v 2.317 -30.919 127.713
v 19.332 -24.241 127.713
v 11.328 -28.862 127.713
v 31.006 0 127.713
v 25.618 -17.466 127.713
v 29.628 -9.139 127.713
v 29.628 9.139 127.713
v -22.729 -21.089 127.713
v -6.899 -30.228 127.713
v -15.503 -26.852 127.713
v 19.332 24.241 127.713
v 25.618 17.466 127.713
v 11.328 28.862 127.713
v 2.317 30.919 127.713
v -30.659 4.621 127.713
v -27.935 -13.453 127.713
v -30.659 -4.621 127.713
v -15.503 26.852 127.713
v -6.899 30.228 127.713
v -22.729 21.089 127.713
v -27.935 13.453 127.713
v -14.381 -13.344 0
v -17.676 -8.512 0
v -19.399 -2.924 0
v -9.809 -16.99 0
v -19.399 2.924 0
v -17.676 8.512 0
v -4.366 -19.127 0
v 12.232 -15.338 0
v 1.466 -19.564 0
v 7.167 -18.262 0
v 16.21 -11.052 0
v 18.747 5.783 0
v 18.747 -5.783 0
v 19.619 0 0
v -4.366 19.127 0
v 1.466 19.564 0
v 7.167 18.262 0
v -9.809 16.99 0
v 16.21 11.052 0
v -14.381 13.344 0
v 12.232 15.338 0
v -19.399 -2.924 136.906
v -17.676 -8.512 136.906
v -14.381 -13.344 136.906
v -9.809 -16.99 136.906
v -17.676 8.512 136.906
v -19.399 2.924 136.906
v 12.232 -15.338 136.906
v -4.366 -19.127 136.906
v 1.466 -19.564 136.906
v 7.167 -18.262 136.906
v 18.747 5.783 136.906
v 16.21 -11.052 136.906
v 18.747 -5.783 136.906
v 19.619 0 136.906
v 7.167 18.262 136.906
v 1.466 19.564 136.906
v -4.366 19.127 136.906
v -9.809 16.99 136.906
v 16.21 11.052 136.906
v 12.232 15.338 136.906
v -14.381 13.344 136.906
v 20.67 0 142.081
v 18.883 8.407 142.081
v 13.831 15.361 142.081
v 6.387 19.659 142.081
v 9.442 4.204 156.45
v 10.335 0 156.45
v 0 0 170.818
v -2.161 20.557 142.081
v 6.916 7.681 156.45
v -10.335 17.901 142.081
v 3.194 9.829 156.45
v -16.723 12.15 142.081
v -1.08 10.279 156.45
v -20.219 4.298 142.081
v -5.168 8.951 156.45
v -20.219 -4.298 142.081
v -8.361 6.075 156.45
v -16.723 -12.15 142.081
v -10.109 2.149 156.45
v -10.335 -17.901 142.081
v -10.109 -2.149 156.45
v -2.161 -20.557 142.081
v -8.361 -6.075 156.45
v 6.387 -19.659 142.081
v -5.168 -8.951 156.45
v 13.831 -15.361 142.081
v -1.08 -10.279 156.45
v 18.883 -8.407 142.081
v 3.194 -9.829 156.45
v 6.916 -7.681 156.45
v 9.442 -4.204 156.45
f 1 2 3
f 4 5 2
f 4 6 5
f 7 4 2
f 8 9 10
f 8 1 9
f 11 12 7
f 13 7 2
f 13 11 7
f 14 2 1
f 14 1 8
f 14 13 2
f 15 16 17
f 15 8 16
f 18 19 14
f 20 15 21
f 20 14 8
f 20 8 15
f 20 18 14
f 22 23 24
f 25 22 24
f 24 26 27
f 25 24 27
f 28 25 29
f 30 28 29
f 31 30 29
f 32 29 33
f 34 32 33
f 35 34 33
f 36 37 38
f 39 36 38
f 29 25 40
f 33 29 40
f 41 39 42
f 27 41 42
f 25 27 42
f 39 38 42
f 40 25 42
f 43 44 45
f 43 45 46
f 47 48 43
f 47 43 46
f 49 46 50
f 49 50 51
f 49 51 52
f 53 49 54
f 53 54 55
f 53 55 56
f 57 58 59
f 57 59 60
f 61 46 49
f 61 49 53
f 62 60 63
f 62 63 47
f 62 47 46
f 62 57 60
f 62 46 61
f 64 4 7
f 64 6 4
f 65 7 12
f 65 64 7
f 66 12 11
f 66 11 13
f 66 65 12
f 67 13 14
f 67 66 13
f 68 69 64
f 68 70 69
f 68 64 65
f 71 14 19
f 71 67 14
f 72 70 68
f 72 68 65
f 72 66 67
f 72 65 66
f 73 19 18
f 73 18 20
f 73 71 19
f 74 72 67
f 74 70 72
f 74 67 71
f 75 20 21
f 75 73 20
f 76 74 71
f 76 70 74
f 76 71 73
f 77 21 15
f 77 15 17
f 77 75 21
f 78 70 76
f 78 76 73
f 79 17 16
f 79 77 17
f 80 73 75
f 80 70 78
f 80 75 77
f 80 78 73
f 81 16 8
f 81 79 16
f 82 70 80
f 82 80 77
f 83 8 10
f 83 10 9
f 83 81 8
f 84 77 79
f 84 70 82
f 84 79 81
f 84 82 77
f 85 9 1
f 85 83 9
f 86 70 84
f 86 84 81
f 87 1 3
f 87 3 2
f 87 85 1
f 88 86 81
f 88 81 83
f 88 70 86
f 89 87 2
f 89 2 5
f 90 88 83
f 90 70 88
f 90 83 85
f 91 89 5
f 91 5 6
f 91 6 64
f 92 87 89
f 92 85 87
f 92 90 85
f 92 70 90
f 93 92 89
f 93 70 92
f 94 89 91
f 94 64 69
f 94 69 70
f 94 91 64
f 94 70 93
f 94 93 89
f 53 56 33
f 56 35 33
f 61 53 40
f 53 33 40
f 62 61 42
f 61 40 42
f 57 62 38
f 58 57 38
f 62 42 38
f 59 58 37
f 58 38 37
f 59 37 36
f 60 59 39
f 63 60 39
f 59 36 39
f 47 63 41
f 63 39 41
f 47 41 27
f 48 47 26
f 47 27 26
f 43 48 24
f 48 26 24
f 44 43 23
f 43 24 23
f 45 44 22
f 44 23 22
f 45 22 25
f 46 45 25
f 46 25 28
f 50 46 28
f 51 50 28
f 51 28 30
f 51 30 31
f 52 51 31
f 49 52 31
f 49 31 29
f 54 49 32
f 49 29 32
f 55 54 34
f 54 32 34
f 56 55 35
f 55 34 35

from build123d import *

# Parameters (mm, degrees)
F0_R      = 19.61856
F1_DEPTH  = 111.506
F1_FACE_R = 19.61856
F2_DEPTH  = 25.4


with BuildPart() as f1:
    # F0 (on Top) → F1 (new body)
    with BuildSketch(Plane.XY):
        Circle(F0_R)
    extrude(amount=F1_DEPTH)

    # F1_face (on face) → F2 (join)
    with BuildSketch(Plane.XY.offset(111.506)):
        Circle(F1_FACE_R)
    extrude(amount=F2_DEPTH)


with BuildPart() as f4:
    # F3 (on Front) → F4 (revolve)
    with BuildSketch(Plane.XZ):
        Polygon((0, 170.818225), (0, 127.712995), (19.444138, 127.712995), (31.00552, 127.712995), align=None)
    revolve(axis=Axis((0, 0, 149.26561), (0, 0, 1)))


solid = Compound([f1.part, f4.part])
